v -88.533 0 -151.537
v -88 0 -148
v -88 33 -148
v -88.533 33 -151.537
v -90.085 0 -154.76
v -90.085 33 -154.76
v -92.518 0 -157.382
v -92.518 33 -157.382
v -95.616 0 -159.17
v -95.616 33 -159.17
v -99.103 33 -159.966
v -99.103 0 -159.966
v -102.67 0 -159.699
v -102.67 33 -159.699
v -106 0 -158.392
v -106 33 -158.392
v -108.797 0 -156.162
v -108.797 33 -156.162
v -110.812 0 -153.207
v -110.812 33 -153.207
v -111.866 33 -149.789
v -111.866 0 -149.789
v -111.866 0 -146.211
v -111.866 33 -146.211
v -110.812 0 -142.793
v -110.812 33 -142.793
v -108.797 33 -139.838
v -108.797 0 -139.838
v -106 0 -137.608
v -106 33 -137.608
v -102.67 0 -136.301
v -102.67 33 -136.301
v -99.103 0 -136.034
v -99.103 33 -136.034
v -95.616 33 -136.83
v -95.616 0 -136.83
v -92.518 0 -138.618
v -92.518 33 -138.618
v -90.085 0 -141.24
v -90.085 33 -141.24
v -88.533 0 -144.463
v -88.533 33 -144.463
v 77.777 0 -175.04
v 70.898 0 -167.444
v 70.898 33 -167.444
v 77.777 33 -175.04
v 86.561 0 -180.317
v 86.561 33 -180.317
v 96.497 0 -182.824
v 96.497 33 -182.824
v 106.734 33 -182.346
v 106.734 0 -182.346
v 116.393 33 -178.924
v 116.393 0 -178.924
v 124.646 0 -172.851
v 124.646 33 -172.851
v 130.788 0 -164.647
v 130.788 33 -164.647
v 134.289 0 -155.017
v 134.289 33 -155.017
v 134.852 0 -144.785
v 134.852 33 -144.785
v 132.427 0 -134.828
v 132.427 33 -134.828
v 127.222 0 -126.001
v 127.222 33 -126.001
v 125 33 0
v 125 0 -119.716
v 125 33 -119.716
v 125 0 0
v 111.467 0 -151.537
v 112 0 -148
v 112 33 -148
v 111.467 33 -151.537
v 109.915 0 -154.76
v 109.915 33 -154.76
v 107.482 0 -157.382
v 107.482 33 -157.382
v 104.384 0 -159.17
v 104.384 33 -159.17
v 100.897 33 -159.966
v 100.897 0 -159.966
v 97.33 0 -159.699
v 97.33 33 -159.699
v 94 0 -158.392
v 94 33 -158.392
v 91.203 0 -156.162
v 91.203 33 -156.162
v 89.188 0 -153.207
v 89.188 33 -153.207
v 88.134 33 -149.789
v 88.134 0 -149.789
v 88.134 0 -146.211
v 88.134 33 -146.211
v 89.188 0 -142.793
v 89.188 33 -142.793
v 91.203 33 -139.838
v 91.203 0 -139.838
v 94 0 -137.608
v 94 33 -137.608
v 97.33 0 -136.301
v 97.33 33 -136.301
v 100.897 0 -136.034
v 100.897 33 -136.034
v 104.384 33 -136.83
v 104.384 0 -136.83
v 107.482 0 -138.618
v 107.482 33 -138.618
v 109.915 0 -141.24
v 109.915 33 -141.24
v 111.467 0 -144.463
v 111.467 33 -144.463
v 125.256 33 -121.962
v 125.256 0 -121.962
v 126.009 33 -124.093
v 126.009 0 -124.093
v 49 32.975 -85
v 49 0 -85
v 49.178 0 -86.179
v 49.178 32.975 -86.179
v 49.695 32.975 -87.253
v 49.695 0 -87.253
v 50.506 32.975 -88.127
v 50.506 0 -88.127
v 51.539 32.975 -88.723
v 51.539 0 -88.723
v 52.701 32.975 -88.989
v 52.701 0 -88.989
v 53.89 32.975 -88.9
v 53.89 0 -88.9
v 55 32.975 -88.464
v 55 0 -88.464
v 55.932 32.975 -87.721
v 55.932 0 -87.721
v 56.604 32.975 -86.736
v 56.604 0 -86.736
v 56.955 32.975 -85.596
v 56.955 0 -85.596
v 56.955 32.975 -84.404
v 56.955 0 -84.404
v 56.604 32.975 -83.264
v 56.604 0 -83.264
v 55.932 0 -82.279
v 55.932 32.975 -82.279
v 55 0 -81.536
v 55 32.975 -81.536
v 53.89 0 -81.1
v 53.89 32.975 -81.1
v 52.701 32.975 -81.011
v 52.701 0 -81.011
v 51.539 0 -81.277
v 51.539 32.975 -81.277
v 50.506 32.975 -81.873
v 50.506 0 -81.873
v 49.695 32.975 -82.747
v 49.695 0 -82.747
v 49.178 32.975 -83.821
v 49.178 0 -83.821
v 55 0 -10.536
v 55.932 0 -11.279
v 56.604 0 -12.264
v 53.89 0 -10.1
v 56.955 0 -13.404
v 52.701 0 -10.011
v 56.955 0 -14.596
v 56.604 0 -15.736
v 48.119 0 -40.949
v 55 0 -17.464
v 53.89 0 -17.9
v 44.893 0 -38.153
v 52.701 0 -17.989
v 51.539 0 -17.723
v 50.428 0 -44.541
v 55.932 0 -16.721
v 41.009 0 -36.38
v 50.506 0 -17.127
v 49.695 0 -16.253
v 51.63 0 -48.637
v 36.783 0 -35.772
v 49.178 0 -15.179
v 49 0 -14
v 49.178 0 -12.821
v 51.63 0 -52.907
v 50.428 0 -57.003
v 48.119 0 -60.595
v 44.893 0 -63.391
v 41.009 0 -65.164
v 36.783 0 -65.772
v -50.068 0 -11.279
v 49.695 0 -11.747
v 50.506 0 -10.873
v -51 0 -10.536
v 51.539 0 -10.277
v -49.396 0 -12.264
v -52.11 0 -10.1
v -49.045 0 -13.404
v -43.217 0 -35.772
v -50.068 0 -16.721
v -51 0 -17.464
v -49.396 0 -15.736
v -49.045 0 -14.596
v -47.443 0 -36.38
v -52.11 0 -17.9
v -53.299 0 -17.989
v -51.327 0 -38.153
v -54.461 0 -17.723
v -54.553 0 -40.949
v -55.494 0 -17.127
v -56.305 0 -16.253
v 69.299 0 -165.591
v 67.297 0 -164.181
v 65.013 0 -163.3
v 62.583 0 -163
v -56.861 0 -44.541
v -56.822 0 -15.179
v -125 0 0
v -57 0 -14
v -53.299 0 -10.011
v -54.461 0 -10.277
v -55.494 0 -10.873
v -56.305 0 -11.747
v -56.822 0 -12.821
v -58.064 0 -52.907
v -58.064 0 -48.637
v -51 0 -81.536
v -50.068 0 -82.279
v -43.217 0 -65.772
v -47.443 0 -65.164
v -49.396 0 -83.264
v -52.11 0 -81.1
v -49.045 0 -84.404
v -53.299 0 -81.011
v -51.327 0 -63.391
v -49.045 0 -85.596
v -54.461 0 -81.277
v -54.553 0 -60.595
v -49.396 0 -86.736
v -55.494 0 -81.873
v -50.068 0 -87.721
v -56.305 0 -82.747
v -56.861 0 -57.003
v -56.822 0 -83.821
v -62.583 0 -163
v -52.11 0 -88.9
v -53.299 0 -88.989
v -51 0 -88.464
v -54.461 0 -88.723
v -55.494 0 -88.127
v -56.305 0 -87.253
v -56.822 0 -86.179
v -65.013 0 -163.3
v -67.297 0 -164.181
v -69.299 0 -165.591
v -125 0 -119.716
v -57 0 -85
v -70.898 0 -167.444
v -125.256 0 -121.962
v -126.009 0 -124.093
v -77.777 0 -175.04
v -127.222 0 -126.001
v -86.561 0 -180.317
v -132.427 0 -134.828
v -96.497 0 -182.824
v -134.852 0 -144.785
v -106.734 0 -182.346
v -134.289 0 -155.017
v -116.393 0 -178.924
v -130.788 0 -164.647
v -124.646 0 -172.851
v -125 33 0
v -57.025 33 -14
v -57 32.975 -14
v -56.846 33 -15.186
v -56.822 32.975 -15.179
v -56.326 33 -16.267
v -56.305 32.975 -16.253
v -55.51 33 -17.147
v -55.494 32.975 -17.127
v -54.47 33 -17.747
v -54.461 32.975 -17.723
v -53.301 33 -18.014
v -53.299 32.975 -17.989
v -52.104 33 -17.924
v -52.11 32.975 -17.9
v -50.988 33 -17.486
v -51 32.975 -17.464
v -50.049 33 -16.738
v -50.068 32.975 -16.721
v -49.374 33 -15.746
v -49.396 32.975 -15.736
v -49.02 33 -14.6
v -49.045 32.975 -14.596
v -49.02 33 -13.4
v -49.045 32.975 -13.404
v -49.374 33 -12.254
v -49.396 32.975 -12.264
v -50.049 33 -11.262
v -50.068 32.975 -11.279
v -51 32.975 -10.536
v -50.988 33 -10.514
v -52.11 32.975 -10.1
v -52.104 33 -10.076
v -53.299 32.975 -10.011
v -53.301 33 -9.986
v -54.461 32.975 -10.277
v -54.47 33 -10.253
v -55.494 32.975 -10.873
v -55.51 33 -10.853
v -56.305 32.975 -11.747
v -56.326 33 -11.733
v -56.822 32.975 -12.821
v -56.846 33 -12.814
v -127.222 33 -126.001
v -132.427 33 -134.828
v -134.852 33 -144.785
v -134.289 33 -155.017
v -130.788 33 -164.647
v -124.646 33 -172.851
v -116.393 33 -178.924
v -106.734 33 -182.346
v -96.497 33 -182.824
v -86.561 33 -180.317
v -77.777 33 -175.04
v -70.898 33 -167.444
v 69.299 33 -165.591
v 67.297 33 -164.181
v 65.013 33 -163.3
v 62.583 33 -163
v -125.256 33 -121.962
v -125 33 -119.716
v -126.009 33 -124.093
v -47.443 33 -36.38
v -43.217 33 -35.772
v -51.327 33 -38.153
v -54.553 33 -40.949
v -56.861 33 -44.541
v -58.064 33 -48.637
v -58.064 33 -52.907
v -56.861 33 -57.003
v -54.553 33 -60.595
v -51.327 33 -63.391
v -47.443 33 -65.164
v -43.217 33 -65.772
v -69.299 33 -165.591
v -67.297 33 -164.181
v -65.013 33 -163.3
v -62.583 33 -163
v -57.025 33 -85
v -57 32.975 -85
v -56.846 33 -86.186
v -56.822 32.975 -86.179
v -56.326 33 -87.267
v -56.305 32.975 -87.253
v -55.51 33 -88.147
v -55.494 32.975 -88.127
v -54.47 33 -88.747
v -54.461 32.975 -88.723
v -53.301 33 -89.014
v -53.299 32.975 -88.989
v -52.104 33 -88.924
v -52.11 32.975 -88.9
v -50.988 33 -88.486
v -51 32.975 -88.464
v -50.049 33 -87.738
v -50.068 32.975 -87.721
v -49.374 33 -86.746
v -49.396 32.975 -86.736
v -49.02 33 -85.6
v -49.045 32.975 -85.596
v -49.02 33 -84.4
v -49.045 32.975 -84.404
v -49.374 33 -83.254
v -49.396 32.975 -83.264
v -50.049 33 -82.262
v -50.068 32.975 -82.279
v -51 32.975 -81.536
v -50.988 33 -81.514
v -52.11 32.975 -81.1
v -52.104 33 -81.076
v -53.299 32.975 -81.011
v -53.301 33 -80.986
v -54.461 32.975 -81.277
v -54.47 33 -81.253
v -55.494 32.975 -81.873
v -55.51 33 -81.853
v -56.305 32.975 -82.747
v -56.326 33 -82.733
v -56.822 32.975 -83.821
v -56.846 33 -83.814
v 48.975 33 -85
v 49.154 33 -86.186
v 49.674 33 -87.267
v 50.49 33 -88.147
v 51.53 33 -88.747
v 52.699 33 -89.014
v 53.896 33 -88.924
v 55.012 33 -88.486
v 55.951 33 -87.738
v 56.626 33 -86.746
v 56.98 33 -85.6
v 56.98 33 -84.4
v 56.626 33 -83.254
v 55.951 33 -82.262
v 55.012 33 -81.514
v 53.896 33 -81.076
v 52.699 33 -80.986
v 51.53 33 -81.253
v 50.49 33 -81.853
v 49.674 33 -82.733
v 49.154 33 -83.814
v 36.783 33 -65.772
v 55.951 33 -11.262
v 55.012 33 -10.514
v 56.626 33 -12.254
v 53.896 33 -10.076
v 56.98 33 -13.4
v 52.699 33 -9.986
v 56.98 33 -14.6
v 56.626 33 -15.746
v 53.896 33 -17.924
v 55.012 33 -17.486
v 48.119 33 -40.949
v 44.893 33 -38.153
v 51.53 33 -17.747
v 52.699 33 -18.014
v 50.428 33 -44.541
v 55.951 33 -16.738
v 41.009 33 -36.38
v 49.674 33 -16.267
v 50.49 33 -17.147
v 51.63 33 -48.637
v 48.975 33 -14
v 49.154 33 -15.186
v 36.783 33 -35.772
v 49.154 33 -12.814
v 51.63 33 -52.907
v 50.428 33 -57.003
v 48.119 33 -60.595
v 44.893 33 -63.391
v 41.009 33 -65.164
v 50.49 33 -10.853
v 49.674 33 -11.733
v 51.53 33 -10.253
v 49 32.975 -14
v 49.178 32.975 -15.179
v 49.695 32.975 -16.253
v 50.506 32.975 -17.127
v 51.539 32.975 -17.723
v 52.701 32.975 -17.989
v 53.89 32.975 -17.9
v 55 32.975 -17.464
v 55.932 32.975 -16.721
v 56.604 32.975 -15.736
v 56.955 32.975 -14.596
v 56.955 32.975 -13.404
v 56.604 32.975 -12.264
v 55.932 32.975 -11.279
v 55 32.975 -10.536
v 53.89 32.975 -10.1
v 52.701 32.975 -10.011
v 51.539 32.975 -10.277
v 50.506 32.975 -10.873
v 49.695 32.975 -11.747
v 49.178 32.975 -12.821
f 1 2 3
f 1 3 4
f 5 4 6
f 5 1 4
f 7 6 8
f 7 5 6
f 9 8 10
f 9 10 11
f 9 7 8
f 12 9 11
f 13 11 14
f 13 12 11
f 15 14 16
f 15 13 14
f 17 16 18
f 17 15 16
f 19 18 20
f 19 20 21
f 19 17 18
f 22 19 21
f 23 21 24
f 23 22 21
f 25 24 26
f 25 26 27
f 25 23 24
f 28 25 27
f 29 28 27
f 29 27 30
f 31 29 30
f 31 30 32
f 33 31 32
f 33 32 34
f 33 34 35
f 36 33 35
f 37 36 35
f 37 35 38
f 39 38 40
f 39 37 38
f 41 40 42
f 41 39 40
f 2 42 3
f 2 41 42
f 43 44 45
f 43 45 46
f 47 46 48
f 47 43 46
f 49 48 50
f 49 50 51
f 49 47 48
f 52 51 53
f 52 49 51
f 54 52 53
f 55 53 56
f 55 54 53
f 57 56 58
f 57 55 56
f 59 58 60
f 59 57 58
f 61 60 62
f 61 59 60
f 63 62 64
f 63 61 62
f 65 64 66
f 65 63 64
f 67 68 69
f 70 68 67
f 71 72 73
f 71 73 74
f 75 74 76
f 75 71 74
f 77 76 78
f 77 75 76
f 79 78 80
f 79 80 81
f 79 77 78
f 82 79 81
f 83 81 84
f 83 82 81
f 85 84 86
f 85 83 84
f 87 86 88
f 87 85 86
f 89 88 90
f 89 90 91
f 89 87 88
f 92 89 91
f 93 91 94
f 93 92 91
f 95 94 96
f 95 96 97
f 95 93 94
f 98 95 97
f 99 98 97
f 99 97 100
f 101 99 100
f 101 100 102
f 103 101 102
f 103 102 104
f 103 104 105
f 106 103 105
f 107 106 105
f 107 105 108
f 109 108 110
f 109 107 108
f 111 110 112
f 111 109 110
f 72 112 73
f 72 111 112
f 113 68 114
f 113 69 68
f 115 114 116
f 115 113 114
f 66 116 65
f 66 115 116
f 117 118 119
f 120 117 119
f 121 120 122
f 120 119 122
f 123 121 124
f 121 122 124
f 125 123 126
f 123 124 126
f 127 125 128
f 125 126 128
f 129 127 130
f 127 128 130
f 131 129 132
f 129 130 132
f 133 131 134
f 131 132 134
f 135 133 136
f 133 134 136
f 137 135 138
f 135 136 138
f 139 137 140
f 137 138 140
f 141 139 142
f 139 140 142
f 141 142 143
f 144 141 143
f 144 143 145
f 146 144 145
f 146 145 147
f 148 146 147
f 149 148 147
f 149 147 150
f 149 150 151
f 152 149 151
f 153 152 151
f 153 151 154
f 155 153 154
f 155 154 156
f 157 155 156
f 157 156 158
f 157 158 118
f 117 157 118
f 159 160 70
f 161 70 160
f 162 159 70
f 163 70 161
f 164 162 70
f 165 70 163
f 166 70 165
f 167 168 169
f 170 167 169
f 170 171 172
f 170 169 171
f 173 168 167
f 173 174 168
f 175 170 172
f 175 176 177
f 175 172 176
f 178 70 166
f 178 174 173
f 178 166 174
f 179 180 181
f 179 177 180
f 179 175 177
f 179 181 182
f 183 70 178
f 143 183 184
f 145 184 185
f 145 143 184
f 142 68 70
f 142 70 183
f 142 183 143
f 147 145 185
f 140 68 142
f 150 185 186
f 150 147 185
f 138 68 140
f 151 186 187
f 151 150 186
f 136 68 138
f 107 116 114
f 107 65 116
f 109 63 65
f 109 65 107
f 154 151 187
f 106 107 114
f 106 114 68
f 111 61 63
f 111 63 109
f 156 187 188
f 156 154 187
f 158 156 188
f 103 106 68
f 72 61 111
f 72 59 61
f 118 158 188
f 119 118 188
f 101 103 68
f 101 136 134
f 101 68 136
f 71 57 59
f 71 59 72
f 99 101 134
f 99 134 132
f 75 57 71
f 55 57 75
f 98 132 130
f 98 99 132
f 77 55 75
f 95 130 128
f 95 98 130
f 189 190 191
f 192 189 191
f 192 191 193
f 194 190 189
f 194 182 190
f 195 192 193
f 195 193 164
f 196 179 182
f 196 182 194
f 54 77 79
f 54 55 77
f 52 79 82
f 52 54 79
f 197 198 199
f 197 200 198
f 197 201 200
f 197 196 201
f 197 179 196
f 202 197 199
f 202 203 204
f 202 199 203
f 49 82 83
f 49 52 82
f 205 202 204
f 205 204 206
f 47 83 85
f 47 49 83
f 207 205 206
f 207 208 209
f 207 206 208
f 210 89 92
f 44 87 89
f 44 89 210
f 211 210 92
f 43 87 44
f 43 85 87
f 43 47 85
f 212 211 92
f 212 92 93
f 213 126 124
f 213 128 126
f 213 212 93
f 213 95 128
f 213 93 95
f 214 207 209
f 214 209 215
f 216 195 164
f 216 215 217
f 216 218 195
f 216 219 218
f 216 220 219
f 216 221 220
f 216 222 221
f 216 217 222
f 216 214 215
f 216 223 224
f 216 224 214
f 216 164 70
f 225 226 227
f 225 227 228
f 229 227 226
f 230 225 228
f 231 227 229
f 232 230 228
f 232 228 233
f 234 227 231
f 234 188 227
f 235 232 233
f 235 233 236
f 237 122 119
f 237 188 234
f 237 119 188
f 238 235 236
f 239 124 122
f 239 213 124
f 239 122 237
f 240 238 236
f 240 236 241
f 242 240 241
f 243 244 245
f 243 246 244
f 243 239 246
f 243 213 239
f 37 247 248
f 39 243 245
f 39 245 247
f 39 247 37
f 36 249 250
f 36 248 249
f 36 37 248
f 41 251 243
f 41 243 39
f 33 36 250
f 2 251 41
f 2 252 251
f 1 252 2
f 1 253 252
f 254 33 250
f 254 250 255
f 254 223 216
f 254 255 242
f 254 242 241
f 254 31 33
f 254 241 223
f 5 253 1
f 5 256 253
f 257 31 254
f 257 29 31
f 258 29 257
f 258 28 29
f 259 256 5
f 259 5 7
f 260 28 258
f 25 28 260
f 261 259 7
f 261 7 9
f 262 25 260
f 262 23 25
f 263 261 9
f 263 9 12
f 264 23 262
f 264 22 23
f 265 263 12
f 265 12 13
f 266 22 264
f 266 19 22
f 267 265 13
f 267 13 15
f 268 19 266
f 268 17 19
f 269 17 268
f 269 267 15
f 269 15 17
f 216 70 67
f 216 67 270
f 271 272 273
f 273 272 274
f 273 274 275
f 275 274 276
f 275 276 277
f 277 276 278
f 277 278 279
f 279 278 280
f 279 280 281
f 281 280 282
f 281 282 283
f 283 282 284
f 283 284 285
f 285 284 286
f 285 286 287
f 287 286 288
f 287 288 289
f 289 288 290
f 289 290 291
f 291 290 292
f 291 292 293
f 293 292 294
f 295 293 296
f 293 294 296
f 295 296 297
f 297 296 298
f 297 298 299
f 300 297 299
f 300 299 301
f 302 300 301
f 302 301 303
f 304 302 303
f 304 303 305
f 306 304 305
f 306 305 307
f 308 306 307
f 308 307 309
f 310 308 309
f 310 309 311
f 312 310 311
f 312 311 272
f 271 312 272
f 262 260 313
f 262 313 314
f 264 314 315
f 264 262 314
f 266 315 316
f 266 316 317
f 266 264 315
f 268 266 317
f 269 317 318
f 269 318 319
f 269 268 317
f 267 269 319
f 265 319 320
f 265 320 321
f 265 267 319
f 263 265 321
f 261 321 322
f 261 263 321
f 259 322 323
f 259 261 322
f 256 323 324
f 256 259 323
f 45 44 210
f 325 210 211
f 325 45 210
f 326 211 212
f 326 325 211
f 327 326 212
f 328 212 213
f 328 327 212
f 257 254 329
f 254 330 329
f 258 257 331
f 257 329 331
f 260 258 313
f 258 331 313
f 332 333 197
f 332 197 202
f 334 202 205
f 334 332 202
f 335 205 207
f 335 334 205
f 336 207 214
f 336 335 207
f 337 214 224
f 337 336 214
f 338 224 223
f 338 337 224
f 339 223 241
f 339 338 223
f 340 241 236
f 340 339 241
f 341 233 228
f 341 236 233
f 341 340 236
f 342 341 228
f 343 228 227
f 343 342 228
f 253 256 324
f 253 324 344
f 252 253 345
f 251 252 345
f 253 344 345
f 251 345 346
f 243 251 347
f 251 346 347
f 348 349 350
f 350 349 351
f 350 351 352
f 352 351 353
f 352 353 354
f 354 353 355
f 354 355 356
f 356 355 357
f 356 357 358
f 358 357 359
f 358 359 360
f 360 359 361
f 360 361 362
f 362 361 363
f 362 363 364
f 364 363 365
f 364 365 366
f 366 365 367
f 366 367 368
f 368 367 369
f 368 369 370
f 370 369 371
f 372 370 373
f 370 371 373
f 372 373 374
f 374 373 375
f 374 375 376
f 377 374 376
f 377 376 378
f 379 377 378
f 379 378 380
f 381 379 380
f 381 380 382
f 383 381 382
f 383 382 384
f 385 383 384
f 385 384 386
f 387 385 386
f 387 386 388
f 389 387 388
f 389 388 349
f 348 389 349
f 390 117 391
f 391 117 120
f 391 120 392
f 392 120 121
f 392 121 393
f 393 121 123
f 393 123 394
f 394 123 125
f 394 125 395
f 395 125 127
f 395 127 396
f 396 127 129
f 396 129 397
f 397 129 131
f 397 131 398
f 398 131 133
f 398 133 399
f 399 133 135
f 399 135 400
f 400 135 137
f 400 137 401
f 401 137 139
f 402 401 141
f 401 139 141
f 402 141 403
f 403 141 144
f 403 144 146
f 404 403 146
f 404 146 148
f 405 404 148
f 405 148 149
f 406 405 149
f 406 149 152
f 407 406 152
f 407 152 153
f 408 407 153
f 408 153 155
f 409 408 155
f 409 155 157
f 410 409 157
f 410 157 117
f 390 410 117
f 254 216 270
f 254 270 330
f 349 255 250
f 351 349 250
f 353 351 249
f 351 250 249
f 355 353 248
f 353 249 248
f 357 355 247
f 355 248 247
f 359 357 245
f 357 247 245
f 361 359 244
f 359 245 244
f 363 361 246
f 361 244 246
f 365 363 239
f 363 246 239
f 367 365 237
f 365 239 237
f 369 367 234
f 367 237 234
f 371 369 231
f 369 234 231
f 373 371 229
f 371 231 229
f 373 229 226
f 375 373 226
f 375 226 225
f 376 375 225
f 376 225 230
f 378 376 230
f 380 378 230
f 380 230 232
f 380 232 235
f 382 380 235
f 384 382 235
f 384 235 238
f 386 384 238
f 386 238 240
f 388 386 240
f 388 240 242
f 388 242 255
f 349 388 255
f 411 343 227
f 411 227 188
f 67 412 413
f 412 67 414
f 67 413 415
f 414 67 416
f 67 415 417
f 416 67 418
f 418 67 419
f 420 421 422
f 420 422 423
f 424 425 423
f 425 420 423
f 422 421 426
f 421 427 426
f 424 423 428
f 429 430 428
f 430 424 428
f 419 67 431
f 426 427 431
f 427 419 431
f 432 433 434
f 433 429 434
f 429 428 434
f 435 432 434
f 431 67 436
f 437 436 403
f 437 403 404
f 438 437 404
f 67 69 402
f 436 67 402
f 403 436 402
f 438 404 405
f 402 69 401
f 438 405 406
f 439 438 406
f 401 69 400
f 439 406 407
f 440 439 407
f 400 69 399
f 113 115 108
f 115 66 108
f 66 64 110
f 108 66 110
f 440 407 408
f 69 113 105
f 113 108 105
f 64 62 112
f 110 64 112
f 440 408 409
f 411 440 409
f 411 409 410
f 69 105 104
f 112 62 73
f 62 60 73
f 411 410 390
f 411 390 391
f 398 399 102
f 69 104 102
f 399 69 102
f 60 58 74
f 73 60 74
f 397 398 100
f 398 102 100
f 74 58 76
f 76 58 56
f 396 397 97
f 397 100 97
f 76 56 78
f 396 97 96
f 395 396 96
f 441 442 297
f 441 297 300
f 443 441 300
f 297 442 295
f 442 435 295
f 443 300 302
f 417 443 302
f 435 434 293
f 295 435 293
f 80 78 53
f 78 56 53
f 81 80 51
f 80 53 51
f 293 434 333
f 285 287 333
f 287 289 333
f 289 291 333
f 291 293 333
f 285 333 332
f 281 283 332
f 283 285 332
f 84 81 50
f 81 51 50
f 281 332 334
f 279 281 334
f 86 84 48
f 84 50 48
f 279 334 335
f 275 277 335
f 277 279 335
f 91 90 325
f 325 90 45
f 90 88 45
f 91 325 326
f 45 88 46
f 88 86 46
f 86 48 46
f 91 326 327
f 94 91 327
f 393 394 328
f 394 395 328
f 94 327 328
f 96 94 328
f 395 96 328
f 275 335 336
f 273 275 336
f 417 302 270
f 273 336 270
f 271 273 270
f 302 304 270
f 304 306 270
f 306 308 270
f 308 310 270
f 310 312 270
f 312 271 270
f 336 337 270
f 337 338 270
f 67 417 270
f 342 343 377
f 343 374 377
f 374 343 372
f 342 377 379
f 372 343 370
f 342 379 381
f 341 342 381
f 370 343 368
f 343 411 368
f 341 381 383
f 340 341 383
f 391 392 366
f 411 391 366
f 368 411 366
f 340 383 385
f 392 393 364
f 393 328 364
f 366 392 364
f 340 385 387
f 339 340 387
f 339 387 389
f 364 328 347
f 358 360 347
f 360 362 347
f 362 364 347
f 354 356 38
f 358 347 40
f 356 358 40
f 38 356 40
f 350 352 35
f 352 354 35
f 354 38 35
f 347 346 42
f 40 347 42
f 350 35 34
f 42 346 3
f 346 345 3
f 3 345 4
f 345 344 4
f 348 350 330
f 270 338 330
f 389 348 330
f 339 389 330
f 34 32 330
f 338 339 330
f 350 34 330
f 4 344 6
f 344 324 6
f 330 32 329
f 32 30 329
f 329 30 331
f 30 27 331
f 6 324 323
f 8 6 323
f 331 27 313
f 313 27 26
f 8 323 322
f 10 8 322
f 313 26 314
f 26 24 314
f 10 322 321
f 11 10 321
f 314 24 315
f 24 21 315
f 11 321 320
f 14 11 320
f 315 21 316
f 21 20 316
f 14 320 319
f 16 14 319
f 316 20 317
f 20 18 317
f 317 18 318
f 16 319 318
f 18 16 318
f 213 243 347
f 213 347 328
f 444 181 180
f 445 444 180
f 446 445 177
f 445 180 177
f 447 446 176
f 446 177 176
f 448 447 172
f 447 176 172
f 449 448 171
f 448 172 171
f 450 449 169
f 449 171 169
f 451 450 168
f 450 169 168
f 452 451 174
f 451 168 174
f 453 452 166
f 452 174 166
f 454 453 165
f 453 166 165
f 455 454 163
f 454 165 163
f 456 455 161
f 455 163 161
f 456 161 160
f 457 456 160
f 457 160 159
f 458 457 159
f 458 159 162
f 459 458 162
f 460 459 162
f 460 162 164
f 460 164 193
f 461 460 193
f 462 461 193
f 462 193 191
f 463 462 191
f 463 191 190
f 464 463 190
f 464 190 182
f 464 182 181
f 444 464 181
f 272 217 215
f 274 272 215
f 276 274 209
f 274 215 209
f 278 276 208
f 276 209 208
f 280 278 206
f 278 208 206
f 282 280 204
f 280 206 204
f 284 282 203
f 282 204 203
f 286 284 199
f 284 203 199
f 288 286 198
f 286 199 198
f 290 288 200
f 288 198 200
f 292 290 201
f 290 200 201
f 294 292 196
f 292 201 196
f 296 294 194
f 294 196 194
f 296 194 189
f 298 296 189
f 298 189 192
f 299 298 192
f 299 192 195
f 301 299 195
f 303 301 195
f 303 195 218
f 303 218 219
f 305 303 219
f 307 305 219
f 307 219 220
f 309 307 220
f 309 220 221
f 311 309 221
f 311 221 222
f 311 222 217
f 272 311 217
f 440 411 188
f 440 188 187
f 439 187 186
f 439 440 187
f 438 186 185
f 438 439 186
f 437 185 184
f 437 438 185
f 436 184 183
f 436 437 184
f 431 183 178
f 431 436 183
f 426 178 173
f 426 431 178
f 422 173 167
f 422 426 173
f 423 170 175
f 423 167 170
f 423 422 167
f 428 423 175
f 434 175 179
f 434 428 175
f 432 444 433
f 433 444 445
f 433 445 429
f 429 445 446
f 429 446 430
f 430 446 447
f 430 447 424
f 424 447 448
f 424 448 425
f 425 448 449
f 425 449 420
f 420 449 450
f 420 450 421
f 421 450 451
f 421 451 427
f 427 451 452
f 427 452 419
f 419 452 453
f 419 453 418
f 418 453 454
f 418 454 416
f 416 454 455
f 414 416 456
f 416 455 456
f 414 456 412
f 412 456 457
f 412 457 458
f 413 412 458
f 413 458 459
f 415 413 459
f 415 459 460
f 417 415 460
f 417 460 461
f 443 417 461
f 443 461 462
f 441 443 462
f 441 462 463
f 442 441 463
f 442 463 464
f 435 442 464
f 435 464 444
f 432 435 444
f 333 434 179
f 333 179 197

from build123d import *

# Parameters (mm, degrees)
SKETCH1_R                   = 12
BOSS_EXTRUDE1_DEPTH         = 33
FILLET1_R                   = 10
M8_TAPPED_HOLE2_D           = 8
M8_TAPPED_HOLE2_DEPTH       = 33
M8_TAPPED_HOLE2_CSINK_D     = 8.05
M8_TAPPED_HOLE2_CSINK_ANGLE = 90
CUT_EXTRUDE1_REACH          = 35


with BuildPart() as part:
    # Sketch1 → Boss-Extrude1 (new body)
    with BuildSketch(Plane(origin=(0, 0, 0), x_dir=(1, 0, 0), z_dir=(0, 1, 0))):
        with BuildLine():
            Line((125, 0), (-125, 0))
            Line((-125, 0), (-125, 123.505102572))
            ThreePointArc((-125, 123.505102572), (-120.023162168, 176.706671295), (-68.377223398, 163))
            Line((-68.377223398, 163), (68.377223398, 163))
            ThreePointArc((68.377223398, 163), (120.023162168, 176.706671295), (125, 123.505102572))
            Line((125, 123.505102572), (125, 0))
        make_face()
        with Locations((-100, 148)):
            Circle(SKETCH1_R, mode=Mode.SUBTRACT)
        with Locations((100, 148)):
            Circle(SKETCH1_R, mode=Mode.SUBTRACT)
    extrude(amount=BOSS_EXTRUDE1_DEPTH)

    # Fillet1
    fillet1_edges = [part.edges().sort_by_distance(p)[0] for p in [
        (-125, 16.5, -123.505102572),
        (-68.377223398, 16.5, -163),
        (68.377223398, 16.5, -163),
        (125, 16.5, -123.505102572),
    ]]
    fillet(fillet1_edges, radius=FILLET1_R)

    # M8 Tapped Hole2
    with Locations(Plane(origin=(0, 33, 0), x_dir=(1, 0, 0), z_dir=(0, 1, 0))):
        with Locations((-53, 85), (53, 85), (53, 14), (-53, 14)):
            CounterSinkHole(M8_TAPPED_HOLE2_D / 2, M8_TAPPED_HOLE2_CSINK_D / 2, depth=M8_TAPPED_HOLE2_DEPTH, counter_sink_angle=M8_TAPPED_HOLE2_CSINK_ANGLE)

    # Sketch6 → Cut-Extrude1 (cut, up to next)
    with BuildSketch(Plane(origin=(0, 33, 0), x_dir=(1, 0, 0), z_dir=(0, 1, 0)), mode=Mode.PRIVATE) as cut_extrude1_sk1:
        with BuildLine():
            Line((-43.216947182, 65.77208412), (36.783052818, 65.77208412))
            ThreePointArc((36.783052818, 65.77208412), (51.783052818, 50.77208412), (36.783052818, 35.77208412))
            Line((36.783052818, 35.77208412), (-43.216947182, 35.77208412))
            ThreePointArc((-43.216947182, 35.77208412), (-58.216947182, 50.77208412), (-43.216947182, 65.77208412))
        make_face()
    cut_extrude1_tool1 = extrude(cut_extrude1_sk1.sketch, amount=-CUT_EXTRUDE1_REACH, mode=Mode.PRIVATE) & part.part
    add(cut_extrude1_tool1.solids().sort_by_distance((-3.216947, 33, -50.772084))[0], mode=Mode.SUBTRACT)


solid = part.part
